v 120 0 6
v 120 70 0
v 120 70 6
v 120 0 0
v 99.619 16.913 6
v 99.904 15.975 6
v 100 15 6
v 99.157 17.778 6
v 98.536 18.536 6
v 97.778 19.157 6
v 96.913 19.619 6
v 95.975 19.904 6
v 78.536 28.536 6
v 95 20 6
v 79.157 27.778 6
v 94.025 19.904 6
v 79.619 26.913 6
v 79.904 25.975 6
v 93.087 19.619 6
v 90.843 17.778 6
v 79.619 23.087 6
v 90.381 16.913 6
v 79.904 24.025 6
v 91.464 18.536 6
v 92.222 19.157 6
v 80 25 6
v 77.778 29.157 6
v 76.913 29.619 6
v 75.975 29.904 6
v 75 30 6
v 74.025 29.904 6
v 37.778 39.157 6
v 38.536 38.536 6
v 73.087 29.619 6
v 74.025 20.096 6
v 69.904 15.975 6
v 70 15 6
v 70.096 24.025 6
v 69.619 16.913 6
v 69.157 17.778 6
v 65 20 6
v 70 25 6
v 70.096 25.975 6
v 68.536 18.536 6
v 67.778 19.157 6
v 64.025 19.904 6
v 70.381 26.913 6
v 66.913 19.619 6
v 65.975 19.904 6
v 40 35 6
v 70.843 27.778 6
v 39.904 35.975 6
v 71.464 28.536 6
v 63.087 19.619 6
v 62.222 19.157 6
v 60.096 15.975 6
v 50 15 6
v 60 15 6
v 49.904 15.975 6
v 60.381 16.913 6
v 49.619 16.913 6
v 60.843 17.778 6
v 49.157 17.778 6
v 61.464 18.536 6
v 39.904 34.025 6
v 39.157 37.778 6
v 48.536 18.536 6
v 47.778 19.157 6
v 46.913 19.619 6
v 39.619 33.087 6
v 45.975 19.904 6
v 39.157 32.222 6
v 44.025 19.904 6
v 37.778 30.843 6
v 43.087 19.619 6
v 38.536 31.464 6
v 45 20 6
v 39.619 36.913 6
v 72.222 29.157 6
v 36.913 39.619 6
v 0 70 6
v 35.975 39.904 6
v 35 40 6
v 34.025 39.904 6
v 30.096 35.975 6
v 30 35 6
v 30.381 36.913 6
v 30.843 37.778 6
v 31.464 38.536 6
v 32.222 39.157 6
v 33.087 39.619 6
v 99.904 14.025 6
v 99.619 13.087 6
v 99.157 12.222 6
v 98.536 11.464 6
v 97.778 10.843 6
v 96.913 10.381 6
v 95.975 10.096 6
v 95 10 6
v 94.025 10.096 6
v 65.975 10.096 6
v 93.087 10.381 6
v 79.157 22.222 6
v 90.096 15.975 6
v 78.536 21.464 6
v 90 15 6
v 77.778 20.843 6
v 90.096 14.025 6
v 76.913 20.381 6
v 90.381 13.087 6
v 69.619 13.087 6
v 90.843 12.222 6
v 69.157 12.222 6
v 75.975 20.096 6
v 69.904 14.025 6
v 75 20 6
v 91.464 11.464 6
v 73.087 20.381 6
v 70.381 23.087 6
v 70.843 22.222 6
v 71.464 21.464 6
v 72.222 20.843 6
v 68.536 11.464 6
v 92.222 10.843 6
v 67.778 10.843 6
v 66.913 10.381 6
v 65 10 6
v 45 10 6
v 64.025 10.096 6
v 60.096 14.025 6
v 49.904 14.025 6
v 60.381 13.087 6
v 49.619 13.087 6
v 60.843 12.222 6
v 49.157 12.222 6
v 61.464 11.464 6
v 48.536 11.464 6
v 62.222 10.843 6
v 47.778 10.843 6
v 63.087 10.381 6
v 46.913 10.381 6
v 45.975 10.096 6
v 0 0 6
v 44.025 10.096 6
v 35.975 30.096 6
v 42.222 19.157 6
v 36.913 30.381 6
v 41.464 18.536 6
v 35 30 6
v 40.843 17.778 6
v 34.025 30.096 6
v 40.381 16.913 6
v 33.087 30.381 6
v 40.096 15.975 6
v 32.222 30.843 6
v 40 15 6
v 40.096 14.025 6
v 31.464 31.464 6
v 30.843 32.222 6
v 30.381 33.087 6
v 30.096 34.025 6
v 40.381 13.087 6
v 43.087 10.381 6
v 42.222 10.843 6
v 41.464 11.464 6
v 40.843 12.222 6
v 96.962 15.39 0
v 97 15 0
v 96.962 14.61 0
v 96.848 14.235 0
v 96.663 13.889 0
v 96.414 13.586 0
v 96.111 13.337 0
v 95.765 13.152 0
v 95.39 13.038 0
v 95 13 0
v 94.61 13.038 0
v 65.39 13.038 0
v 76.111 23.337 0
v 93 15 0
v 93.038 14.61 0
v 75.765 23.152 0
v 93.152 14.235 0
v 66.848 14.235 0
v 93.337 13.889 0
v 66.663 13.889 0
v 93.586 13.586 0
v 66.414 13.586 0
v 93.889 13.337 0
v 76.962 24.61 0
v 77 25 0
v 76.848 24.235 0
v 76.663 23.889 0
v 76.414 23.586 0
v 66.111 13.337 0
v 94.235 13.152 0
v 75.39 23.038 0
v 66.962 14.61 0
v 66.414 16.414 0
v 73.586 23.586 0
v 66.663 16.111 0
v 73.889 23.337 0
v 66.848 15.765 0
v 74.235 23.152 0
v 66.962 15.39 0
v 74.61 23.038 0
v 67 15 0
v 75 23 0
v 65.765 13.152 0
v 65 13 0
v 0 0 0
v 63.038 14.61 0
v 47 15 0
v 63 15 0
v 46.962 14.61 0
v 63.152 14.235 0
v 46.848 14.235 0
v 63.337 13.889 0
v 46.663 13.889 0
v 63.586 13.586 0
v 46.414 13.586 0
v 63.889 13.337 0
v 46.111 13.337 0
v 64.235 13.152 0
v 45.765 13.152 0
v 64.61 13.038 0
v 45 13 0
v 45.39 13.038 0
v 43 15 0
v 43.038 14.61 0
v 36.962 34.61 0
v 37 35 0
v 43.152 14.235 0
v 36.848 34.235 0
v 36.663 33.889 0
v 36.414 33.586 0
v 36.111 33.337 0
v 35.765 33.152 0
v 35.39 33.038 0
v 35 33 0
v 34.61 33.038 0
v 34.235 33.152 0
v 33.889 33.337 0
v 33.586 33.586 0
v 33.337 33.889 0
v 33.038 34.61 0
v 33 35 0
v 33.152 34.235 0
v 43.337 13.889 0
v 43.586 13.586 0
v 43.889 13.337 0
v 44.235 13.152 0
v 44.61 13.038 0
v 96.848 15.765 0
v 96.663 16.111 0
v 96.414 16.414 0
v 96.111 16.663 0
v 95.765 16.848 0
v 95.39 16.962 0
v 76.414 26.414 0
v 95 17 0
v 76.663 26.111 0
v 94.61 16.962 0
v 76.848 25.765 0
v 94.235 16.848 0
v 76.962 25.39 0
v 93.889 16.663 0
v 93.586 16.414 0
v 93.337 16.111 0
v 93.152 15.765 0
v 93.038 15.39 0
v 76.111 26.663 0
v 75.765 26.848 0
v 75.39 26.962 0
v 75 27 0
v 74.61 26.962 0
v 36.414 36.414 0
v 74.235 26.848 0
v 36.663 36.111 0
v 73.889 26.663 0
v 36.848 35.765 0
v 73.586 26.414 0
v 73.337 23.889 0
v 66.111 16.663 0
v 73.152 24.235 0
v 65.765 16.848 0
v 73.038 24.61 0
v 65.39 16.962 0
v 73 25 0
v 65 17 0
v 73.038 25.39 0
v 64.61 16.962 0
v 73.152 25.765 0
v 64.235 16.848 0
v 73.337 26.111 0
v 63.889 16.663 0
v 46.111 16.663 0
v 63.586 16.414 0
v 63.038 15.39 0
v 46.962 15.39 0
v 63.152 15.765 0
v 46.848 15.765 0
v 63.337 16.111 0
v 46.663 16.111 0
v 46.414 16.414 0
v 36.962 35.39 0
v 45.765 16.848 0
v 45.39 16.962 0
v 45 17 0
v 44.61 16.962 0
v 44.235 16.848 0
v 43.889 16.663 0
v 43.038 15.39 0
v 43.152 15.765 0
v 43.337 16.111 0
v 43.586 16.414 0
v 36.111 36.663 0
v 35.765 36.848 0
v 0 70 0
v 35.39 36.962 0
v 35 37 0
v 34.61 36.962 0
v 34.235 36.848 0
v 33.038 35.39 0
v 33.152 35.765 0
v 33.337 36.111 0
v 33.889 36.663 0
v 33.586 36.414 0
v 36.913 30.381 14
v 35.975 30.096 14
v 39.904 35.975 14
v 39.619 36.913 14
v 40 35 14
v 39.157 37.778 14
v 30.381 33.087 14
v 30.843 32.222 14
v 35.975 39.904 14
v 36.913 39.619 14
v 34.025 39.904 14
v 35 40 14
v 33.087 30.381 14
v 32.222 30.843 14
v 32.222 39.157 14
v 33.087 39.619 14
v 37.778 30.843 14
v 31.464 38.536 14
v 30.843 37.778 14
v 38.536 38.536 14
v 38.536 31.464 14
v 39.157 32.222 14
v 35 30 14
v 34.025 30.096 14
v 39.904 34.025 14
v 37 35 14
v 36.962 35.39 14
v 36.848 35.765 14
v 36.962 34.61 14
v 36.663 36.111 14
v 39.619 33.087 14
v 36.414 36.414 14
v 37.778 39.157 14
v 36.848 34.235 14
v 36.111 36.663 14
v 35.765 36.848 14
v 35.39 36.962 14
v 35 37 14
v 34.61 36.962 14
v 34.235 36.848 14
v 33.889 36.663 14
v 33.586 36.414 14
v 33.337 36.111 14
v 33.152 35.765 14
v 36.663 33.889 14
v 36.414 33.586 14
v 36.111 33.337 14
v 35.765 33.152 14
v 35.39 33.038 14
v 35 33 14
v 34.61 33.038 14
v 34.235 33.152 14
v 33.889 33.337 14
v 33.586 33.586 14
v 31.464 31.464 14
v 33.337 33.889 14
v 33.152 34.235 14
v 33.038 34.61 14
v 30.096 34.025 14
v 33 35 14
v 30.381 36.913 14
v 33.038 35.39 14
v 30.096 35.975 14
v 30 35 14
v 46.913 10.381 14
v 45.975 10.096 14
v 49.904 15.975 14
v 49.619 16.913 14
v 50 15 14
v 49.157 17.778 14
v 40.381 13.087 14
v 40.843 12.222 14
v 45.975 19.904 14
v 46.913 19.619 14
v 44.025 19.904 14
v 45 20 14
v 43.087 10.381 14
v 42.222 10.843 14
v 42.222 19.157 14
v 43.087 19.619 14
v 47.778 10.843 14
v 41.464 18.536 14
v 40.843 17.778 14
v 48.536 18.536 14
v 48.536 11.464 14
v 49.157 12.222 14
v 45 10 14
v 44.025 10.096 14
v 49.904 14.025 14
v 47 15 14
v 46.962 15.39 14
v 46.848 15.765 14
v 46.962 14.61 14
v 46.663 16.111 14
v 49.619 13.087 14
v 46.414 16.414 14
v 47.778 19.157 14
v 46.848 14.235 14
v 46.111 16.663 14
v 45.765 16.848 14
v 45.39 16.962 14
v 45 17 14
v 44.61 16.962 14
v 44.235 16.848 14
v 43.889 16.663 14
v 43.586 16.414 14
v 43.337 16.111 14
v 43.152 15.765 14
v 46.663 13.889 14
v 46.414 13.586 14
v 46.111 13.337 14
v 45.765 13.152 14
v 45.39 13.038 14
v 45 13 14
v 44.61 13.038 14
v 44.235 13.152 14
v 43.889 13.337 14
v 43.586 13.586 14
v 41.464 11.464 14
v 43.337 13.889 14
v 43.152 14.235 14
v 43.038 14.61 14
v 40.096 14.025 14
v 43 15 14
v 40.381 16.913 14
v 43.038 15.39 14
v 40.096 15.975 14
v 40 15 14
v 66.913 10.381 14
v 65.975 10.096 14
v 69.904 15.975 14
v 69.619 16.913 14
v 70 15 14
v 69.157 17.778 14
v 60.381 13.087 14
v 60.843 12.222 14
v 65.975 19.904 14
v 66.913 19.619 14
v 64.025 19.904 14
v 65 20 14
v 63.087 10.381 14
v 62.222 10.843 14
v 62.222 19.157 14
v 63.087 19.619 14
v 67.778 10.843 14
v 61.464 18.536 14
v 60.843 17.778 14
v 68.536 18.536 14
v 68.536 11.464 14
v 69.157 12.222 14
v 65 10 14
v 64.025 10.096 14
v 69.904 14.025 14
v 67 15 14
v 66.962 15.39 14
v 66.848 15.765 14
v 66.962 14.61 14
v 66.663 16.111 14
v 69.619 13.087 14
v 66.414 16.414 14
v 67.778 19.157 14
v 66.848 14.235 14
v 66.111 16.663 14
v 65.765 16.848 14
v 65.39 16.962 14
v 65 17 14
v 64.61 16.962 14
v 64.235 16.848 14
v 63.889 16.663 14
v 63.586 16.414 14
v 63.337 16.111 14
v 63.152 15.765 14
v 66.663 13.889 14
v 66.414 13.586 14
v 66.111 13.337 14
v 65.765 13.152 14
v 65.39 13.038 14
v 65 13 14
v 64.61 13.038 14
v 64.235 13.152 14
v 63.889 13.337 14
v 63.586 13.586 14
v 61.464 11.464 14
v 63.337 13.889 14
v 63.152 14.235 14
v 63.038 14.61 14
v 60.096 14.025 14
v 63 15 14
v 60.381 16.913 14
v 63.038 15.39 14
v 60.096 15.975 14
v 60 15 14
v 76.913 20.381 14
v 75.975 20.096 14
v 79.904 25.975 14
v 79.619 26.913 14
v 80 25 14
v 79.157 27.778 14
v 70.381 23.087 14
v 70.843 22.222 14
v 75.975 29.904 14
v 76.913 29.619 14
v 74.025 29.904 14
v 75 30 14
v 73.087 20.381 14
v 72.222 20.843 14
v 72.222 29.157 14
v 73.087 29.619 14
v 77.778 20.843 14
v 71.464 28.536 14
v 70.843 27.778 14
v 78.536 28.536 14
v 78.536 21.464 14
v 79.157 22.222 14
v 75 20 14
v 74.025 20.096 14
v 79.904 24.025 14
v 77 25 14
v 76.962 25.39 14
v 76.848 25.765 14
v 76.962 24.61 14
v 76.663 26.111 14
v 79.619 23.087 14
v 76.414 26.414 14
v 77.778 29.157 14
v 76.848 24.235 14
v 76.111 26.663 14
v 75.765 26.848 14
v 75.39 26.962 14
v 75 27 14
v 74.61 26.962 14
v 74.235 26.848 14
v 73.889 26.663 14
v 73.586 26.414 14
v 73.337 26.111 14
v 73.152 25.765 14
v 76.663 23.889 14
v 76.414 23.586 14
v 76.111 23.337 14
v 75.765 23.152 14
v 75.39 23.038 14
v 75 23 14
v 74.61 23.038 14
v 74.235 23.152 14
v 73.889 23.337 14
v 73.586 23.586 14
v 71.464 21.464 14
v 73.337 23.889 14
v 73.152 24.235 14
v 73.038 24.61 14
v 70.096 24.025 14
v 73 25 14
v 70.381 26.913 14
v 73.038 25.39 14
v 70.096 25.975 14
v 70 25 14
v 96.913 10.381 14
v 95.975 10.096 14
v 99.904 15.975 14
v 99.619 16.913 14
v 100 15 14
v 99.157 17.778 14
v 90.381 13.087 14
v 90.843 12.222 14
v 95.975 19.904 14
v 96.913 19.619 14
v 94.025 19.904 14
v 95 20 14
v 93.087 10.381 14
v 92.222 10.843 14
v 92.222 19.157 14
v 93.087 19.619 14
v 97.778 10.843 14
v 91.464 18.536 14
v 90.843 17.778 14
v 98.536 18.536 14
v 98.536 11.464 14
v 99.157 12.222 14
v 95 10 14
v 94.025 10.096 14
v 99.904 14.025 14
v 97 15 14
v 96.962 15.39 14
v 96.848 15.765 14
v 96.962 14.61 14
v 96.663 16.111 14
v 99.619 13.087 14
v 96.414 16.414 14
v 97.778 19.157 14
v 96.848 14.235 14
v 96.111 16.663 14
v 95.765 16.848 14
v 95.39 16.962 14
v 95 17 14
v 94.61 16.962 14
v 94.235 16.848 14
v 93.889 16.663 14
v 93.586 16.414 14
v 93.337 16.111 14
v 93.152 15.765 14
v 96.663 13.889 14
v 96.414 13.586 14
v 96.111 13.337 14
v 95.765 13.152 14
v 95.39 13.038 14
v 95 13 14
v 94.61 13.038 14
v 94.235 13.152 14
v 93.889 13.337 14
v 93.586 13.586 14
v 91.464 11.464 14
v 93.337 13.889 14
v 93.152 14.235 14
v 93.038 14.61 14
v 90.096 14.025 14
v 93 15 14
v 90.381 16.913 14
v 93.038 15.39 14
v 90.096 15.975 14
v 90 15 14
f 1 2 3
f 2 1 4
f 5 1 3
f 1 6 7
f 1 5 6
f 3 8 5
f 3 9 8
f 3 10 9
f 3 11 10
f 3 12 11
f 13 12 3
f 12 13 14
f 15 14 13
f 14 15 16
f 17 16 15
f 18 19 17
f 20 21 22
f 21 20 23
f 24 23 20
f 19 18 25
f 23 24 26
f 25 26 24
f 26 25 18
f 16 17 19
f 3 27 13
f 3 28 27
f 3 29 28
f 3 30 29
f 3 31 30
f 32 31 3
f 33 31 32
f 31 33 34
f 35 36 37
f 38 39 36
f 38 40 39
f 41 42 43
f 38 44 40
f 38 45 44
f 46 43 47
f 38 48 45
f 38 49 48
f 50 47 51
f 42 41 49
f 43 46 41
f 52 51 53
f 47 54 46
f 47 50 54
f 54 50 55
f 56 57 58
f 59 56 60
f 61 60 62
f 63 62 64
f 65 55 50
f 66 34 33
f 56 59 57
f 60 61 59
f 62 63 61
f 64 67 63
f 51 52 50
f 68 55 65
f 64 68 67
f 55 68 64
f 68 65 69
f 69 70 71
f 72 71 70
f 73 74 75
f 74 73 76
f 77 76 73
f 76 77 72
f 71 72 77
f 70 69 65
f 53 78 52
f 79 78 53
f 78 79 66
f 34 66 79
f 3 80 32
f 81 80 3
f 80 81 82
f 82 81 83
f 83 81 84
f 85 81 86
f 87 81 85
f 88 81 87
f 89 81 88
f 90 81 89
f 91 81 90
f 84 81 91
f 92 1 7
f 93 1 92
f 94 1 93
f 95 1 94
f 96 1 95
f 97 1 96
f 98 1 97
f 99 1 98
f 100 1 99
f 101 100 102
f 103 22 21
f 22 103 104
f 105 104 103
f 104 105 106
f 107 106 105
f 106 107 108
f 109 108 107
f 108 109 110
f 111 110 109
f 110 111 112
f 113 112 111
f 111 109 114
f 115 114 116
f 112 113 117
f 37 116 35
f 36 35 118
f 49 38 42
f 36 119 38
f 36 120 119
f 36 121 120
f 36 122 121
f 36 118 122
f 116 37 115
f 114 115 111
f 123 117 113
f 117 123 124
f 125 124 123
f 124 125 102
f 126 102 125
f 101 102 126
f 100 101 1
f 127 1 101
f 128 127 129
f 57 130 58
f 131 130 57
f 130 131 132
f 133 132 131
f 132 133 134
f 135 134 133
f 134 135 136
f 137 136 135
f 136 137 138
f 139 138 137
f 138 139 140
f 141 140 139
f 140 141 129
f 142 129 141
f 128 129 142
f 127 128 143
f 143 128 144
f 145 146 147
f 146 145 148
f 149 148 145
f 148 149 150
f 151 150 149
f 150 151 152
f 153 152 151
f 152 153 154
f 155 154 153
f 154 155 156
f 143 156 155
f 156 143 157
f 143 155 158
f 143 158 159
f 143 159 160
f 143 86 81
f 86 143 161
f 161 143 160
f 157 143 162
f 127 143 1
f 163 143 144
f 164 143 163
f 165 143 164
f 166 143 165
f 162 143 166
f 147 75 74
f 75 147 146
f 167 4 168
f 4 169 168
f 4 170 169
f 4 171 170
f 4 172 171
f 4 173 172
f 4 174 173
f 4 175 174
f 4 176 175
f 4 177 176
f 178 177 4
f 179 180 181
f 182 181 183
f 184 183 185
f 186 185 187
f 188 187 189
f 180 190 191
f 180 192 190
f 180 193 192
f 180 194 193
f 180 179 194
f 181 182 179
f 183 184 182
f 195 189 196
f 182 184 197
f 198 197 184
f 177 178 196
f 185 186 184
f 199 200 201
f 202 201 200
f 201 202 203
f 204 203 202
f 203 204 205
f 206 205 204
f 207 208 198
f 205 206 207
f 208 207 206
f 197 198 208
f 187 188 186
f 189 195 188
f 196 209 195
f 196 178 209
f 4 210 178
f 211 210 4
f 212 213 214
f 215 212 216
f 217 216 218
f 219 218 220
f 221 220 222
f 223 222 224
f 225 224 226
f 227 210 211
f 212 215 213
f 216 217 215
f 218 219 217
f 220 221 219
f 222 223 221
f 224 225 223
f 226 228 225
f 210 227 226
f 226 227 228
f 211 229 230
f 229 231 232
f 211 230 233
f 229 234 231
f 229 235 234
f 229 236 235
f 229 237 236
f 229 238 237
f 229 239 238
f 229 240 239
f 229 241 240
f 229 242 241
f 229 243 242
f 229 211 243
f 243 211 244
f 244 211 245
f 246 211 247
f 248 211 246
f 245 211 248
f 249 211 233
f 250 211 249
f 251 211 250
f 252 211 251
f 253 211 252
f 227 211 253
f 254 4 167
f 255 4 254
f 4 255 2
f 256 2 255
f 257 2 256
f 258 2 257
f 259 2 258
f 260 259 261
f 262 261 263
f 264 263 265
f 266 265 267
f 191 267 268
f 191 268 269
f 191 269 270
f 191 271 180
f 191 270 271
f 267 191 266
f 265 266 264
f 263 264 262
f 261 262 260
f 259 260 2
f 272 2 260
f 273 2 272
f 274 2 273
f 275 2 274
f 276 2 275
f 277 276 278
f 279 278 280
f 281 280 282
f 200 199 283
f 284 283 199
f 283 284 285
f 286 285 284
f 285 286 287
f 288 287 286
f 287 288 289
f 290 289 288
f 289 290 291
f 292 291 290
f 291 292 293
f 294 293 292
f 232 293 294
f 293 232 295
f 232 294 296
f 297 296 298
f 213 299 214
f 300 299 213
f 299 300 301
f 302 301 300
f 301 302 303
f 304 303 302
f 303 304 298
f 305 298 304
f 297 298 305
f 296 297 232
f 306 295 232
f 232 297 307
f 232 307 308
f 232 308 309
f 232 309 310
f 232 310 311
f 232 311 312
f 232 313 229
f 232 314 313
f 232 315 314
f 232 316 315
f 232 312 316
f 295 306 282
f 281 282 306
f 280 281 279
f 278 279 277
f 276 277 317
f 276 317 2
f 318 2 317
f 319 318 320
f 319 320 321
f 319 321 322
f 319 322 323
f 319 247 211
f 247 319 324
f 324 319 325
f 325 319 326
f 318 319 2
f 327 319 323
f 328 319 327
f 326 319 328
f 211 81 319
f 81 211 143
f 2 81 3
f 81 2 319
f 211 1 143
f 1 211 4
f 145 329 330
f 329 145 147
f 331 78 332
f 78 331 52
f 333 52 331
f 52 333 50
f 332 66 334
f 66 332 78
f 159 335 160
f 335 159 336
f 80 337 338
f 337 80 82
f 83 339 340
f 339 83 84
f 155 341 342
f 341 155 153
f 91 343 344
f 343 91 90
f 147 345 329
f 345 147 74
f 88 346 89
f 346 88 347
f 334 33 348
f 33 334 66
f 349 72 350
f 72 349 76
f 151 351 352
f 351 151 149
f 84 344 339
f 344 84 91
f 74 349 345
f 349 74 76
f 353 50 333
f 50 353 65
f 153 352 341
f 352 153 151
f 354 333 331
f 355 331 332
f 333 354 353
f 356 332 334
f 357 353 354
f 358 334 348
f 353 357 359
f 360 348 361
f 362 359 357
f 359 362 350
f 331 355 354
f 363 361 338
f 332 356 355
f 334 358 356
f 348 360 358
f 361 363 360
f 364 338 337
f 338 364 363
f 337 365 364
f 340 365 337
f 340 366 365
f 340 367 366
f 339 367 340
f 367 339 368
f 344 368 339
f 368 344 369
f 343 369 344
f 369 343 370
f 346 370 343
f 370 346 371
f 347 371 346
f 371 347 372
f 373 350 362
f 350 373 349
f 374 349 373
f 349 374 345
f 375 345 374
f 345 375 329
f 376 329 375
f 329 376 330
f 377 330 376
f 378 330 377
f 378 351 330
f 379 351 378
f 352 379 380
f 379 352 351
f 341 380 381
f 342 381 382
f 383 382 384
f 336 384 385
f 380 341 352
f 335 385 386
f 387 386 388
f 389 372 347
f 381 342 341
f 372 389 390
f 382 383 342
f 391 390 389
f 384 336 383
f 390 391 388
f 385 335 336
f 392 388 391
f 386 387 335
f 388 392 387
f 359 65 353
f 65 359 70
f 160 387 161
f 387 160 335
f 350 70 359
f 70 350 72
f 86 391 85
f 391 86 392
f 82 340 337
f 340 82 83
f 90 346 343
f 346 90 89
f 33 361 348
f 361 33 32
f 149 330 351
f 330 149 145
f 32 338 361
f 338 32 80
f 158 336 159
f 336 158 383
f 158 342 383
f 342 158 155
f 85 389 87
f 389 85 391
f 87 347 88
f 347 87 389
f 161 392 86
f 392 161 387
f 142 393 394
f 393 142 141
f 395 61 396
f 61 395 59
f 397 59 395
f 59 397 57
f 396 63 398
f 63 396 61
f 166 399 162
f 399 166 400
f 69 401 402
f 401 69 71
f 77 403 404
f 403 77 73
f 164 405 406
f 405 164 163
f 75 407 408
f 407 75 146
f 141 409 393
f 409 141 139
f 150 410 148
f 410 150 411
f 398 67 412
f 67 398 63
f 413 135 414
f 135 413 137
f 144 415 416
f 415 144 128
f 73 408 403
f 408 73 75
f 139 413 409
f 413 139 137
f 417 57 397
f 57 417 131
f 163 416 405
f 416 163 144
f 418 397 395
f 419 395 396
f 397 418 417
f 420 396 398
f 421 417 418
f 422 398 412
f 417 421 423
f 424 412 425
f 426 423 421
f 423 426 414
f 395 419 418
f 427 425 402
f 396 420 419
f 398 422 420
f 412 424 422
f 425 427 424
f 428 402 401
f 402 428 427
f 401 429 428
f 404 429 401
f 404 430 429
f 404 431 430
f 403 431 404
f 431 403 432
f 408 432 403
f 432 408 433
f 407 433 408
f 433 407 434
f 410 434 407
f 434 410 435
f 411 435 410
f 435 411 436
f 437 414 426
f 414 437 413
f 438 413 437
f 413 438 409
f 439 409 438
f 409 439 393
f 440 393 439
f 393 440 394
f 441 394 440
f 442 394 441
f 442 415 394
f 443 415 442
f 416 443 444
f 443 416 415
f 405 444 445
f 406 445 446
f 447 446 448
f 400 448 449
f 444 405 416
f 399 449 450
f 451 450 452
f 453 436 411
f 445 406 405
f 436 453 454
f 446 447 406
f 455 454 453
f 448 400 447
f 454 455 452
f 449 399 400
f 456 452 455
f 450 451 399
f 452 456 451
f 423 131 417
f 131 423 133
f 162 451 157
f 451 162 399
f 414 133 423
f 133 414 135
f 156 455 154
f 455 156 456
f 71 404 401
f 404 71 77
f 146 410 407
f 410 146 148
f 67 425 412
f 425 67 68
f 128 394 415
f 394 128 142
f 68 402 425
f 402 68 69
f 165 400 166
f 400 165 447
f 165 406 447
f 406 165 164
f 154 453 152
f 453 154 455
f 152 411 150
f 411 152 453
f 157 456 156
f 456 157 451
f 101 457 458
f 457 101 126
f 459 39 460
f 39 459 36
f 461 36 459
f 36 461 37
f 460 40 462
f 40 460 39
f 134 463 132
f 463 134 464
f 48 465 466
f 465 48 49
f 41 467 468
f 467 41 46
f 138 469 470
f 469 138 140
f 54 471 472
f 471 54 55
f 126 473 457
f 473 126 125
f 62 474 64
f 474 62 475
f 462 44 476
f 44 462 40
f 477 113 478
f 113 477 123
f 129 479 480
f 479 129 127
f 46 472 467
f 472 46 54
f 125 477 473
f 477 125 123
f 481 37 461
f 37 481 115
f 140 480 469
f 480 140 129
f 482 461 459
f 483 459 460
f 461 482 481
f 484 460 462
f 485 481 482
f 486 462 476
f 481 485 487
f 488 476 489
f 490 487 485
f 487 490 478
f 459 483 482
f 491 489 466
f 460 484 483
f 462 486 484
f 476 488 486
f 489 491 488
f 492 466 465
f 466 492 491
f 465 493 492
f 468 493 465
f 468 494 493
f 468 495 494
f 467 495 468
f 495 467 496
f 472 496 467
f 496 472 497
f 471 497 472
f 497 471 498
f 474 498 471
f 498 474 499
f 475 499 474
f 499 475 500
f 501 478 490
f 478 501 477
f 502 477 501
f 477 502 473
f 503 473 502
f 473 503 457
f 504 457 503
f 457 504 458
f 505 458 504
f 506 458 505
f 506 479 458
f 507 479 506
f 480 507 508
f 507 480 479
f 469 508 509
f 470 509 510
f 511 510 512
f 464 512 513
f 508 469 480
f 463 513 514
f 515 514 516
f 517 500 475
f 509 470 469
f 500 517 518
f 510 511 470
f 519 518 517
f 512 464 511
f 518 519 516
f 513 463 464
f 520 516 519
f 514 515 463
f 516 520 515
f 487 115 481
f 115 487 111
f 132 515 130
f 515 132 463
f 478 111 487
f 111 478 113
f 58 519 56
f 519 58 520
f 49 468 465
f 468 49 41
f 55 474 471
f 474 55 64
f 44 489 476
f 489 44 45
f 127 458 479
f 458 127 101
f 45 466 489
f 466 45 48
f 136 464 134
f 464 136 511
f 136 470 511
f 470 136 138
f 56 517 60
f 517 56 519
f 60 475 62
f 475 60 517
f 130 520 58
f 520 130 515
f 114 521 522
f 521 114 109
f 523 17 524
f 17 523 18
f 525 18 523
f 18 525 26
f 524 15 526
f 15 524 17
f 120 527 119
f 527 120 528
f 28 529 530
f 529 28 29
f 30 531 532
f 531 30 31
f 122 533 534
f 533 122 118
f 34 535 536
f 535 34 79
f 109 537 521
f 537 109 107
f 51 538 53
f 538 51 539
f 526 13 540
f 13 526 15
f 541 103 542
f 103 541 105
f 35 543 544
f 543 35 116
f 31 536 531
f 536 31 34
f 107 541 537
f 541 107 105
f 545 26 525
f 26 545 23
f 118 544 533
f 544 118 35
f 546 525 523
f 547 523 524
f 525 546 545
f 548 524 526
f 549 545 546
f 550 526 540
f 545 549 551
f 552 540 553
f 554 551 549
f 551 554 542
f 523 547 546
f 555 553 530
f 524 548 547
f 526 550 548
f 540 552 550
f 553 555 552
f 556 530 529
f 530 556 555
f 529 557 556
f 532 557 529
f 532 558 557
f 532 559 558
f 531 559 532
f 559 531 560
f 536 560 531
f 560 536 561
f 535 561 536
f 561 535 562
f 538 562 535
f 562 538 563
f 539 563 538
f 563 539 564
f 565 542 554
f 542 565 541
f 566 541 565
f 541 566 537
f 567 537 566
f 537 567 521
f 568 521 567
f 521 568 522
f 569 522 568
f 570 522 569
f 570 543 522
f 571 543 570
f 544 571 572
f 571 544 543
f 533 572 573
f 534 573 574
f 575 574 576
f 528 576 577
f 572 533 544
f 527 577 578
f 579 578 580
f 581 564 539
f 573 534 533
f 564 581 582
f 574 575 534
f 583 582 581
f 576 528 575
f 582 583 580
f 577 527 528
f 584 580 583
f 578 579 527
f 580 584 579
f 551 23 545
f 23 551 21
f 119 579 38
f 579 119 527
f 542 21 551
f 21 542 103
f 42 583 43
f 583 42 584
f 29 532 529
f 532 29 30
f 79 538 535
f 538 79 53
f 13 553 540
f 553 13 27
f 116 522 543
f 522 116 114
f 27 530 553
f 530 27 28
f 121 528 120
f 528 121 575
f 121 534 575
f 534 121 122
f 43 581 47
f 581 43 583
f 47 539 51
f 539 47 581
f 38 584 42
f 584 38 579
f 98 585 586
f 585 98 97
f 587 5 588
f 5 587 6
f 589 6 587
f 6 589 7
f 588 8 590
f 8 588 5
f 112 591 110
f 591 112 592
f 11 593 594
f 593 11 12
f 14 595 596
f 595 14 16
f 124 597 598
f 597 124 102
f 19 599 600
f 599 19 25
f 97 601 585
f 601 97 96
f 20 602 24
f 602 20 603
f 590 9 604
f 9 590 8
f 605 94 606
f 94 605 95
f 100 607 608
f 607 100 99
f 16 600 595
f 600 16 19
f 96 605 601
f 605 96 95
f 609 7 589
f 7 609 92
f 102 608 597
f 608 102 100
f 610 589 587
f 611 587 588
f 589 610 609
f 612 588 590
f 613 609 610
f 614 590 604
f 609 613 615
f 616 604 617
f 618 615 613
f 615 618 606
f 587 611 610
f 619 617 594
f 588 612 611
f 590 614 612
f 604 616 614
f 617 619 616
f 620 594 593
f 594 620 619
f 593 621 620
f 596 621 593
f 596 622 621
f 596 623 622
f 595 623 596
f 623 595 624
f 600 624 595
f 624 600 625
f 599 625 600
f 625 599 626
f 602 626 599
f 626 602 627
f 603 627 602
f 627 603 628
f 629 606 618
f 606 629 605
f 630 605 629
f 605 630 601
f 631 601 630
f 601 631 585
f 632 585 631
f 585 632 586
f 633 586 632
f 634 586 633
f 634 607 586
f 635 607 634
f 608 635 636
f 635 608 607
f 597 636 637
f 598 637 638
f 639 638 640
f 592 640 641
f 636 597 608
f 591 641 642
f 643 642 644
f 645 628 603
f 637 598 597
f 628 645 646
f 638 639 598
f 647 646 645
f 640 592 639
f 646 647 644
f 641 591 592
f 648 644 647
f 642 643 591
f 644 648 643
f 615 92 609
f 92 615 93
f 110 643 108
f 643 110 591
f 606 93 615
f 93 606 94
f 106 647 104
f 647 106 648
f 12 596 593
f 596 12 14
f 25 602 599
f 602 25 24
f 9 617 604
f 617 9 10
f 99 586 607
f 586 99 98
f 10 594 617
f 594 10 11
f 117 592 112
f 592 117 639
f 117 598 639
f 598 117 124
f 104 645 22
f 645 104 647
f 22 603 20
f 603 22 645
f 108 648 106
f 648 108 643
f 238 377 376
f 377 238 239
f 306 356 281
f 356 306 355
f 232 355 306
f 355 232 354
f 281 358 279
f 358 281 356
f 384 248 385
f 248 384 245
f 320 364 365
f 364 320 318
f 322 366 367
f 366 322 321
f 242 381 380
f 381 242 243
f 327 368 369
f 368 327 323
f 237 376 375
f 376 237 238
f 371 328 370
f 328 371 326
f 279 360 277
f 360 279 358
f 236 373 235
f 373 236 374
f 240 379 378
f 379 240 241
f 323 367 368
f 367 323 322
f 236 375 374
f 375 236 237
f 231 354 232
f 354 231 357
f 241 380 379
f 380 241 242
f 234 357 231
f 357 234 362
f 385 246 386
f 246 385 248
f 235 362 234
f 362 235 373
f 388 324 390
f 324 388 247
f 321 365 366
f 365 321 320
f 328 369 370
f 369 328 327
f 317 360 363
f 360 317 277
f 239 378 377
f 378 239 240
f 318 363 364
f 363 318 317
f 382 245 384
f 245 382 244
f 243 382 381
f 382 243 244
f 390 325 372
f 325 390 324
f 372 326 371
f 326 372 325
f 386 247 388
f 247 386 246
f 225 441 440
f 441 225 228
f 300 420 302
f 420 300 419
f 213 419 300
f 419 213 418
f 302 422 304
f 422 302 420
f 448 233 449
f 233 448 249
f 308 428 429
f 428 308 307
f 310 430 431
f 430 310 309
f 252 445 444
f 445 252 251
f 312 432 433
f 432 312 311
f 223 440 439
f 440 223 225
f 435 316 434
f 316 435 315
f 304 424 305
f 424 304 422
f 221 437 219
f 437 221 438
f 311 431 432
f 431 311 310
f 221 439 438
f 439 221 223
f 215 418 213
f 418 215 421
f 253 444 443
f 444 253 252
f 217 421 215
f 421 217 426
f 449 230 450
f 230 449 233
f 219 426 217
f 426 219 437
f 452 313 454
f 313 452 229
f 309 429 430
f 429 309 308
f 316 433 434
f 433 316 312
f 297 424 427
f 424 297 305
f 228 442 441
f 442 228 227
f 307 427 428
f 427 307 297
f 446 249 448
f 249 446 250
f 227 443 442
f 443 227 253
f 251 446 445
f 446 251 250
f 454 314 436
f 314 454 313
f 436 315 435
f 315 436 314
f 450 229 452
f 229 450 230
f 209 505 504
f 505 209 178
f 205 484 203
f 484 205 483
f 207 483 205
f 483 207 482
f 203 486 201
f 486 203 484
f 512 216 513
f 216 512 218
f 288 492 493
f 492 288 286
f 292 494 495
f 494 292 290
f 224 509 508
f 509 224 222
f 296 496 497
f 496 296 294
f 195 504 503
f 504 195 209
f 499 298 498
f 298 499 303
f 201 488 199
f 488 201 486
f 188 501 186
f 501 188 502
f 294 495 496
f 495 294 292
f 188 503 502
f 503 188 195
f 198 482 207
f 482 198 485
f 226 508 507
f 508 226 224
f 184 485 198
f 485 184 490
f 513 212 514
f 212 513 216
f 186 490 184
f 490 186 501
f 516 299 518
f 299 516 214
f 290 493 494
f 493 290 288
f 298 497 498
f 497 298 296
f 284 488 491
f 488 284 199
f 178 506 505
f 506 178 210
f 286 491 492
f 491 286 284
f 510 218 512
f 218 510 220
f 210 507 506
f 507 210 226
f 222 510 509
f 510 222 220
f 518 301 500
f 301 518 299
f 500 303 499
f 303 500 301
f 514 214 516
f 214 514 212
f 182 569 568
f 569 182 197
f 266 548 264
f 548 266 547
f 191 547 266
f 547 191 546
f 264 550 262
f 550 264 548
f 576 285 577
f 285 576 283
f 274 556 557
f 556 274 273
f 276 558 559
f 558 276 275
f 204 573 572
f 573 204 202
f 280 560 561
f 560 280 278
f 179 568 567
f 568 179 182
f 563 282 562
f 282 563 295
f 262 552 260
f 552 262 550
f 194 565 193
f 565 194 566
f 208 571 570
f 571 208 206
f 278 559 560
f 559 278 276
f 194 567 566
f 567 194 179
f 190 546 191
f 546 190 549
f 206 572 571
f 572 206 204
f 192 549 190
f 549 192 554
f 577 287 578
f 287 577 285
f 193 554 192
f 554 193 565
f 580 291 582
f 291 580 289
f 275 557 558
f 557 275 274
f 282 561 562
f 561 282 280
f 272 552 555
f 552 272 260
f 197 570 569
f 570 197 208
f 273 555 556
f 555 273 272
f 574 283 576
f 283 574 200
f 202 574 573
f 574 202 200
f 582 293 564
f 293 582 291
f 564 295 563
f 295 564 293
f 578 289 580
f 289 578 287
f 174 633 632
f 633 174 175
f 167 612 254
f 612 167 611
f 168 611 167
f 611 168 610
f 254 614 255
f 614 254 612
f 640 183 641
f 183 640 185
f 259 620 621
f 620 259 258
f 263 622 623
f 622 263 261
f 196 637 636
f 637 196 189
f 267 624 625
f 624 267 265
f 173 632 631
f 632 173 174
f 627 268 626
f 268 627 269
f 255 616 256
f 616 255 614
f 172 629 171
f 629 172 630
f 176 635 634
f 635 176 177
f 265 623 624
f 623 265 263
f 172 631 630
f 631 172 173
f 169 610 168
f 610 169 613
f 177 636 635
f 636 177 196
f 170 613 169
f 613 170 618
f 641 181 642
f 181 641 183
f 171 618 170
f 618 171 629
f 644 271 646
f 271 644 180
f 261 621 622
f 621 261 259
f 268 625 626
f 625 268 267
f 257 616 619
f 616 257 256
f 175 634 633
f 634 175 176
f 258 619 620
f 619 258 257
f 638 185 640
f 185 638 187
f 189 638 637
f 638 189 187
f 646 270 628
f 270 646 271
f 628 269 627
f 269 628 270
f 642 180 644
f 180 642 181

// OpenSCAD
$fn = 32;

// ----------------------------------------------------------------------
// Boss field: plate with bosses at given coordinates
// ----------------------------------------------------------------------

// --- parameters (mm) ---
plate_l = 120;            // plate length, X
plate_w = 70;             // plate width, Y
plate_t = 6;              // plate thickness, Z
boss_d = 10;              // boss diameter
boss_h = 8;               // boss height above the plate
bore_d = 4;               // boss bore

total_h = plate_t + boss_h;  // overall height

difference() {
  union() {
    cube([plate_l, plate_w, plate_t]);
    translate([35, 35, plate_t]) cylinder(h = boss_h, d = boss_d);
    translate([45, 15, plate_t]) cylinder(h = boss_h, d = boss_d);
    translate([65, 15, plate_t]) cylinder(h = boss_h, d = boss_d);
    translate([75, 25, plate_t]) cylinder(h = boss_h, d = boss_d);
    translate([95, 15, plate_t]) cylinder(h = boss_h, d = boss_d);
  }
  translate([35, 35, -1]) cylinder(h = total_h + 2, d = bore_d);
  translate([45, 15, -1]) cylinder(h = total_h + 2, d = bore_d);
  translate([65, 15, -1]) cylinder(h = total_h + 2, d = bore_d);
  translate([75, 25, -1]) cylinder(h = total_h + 2, d = bore_d);
  translate([95, 15, -1]) cylinder(h = total_h + 2, d = bore_d);
}
